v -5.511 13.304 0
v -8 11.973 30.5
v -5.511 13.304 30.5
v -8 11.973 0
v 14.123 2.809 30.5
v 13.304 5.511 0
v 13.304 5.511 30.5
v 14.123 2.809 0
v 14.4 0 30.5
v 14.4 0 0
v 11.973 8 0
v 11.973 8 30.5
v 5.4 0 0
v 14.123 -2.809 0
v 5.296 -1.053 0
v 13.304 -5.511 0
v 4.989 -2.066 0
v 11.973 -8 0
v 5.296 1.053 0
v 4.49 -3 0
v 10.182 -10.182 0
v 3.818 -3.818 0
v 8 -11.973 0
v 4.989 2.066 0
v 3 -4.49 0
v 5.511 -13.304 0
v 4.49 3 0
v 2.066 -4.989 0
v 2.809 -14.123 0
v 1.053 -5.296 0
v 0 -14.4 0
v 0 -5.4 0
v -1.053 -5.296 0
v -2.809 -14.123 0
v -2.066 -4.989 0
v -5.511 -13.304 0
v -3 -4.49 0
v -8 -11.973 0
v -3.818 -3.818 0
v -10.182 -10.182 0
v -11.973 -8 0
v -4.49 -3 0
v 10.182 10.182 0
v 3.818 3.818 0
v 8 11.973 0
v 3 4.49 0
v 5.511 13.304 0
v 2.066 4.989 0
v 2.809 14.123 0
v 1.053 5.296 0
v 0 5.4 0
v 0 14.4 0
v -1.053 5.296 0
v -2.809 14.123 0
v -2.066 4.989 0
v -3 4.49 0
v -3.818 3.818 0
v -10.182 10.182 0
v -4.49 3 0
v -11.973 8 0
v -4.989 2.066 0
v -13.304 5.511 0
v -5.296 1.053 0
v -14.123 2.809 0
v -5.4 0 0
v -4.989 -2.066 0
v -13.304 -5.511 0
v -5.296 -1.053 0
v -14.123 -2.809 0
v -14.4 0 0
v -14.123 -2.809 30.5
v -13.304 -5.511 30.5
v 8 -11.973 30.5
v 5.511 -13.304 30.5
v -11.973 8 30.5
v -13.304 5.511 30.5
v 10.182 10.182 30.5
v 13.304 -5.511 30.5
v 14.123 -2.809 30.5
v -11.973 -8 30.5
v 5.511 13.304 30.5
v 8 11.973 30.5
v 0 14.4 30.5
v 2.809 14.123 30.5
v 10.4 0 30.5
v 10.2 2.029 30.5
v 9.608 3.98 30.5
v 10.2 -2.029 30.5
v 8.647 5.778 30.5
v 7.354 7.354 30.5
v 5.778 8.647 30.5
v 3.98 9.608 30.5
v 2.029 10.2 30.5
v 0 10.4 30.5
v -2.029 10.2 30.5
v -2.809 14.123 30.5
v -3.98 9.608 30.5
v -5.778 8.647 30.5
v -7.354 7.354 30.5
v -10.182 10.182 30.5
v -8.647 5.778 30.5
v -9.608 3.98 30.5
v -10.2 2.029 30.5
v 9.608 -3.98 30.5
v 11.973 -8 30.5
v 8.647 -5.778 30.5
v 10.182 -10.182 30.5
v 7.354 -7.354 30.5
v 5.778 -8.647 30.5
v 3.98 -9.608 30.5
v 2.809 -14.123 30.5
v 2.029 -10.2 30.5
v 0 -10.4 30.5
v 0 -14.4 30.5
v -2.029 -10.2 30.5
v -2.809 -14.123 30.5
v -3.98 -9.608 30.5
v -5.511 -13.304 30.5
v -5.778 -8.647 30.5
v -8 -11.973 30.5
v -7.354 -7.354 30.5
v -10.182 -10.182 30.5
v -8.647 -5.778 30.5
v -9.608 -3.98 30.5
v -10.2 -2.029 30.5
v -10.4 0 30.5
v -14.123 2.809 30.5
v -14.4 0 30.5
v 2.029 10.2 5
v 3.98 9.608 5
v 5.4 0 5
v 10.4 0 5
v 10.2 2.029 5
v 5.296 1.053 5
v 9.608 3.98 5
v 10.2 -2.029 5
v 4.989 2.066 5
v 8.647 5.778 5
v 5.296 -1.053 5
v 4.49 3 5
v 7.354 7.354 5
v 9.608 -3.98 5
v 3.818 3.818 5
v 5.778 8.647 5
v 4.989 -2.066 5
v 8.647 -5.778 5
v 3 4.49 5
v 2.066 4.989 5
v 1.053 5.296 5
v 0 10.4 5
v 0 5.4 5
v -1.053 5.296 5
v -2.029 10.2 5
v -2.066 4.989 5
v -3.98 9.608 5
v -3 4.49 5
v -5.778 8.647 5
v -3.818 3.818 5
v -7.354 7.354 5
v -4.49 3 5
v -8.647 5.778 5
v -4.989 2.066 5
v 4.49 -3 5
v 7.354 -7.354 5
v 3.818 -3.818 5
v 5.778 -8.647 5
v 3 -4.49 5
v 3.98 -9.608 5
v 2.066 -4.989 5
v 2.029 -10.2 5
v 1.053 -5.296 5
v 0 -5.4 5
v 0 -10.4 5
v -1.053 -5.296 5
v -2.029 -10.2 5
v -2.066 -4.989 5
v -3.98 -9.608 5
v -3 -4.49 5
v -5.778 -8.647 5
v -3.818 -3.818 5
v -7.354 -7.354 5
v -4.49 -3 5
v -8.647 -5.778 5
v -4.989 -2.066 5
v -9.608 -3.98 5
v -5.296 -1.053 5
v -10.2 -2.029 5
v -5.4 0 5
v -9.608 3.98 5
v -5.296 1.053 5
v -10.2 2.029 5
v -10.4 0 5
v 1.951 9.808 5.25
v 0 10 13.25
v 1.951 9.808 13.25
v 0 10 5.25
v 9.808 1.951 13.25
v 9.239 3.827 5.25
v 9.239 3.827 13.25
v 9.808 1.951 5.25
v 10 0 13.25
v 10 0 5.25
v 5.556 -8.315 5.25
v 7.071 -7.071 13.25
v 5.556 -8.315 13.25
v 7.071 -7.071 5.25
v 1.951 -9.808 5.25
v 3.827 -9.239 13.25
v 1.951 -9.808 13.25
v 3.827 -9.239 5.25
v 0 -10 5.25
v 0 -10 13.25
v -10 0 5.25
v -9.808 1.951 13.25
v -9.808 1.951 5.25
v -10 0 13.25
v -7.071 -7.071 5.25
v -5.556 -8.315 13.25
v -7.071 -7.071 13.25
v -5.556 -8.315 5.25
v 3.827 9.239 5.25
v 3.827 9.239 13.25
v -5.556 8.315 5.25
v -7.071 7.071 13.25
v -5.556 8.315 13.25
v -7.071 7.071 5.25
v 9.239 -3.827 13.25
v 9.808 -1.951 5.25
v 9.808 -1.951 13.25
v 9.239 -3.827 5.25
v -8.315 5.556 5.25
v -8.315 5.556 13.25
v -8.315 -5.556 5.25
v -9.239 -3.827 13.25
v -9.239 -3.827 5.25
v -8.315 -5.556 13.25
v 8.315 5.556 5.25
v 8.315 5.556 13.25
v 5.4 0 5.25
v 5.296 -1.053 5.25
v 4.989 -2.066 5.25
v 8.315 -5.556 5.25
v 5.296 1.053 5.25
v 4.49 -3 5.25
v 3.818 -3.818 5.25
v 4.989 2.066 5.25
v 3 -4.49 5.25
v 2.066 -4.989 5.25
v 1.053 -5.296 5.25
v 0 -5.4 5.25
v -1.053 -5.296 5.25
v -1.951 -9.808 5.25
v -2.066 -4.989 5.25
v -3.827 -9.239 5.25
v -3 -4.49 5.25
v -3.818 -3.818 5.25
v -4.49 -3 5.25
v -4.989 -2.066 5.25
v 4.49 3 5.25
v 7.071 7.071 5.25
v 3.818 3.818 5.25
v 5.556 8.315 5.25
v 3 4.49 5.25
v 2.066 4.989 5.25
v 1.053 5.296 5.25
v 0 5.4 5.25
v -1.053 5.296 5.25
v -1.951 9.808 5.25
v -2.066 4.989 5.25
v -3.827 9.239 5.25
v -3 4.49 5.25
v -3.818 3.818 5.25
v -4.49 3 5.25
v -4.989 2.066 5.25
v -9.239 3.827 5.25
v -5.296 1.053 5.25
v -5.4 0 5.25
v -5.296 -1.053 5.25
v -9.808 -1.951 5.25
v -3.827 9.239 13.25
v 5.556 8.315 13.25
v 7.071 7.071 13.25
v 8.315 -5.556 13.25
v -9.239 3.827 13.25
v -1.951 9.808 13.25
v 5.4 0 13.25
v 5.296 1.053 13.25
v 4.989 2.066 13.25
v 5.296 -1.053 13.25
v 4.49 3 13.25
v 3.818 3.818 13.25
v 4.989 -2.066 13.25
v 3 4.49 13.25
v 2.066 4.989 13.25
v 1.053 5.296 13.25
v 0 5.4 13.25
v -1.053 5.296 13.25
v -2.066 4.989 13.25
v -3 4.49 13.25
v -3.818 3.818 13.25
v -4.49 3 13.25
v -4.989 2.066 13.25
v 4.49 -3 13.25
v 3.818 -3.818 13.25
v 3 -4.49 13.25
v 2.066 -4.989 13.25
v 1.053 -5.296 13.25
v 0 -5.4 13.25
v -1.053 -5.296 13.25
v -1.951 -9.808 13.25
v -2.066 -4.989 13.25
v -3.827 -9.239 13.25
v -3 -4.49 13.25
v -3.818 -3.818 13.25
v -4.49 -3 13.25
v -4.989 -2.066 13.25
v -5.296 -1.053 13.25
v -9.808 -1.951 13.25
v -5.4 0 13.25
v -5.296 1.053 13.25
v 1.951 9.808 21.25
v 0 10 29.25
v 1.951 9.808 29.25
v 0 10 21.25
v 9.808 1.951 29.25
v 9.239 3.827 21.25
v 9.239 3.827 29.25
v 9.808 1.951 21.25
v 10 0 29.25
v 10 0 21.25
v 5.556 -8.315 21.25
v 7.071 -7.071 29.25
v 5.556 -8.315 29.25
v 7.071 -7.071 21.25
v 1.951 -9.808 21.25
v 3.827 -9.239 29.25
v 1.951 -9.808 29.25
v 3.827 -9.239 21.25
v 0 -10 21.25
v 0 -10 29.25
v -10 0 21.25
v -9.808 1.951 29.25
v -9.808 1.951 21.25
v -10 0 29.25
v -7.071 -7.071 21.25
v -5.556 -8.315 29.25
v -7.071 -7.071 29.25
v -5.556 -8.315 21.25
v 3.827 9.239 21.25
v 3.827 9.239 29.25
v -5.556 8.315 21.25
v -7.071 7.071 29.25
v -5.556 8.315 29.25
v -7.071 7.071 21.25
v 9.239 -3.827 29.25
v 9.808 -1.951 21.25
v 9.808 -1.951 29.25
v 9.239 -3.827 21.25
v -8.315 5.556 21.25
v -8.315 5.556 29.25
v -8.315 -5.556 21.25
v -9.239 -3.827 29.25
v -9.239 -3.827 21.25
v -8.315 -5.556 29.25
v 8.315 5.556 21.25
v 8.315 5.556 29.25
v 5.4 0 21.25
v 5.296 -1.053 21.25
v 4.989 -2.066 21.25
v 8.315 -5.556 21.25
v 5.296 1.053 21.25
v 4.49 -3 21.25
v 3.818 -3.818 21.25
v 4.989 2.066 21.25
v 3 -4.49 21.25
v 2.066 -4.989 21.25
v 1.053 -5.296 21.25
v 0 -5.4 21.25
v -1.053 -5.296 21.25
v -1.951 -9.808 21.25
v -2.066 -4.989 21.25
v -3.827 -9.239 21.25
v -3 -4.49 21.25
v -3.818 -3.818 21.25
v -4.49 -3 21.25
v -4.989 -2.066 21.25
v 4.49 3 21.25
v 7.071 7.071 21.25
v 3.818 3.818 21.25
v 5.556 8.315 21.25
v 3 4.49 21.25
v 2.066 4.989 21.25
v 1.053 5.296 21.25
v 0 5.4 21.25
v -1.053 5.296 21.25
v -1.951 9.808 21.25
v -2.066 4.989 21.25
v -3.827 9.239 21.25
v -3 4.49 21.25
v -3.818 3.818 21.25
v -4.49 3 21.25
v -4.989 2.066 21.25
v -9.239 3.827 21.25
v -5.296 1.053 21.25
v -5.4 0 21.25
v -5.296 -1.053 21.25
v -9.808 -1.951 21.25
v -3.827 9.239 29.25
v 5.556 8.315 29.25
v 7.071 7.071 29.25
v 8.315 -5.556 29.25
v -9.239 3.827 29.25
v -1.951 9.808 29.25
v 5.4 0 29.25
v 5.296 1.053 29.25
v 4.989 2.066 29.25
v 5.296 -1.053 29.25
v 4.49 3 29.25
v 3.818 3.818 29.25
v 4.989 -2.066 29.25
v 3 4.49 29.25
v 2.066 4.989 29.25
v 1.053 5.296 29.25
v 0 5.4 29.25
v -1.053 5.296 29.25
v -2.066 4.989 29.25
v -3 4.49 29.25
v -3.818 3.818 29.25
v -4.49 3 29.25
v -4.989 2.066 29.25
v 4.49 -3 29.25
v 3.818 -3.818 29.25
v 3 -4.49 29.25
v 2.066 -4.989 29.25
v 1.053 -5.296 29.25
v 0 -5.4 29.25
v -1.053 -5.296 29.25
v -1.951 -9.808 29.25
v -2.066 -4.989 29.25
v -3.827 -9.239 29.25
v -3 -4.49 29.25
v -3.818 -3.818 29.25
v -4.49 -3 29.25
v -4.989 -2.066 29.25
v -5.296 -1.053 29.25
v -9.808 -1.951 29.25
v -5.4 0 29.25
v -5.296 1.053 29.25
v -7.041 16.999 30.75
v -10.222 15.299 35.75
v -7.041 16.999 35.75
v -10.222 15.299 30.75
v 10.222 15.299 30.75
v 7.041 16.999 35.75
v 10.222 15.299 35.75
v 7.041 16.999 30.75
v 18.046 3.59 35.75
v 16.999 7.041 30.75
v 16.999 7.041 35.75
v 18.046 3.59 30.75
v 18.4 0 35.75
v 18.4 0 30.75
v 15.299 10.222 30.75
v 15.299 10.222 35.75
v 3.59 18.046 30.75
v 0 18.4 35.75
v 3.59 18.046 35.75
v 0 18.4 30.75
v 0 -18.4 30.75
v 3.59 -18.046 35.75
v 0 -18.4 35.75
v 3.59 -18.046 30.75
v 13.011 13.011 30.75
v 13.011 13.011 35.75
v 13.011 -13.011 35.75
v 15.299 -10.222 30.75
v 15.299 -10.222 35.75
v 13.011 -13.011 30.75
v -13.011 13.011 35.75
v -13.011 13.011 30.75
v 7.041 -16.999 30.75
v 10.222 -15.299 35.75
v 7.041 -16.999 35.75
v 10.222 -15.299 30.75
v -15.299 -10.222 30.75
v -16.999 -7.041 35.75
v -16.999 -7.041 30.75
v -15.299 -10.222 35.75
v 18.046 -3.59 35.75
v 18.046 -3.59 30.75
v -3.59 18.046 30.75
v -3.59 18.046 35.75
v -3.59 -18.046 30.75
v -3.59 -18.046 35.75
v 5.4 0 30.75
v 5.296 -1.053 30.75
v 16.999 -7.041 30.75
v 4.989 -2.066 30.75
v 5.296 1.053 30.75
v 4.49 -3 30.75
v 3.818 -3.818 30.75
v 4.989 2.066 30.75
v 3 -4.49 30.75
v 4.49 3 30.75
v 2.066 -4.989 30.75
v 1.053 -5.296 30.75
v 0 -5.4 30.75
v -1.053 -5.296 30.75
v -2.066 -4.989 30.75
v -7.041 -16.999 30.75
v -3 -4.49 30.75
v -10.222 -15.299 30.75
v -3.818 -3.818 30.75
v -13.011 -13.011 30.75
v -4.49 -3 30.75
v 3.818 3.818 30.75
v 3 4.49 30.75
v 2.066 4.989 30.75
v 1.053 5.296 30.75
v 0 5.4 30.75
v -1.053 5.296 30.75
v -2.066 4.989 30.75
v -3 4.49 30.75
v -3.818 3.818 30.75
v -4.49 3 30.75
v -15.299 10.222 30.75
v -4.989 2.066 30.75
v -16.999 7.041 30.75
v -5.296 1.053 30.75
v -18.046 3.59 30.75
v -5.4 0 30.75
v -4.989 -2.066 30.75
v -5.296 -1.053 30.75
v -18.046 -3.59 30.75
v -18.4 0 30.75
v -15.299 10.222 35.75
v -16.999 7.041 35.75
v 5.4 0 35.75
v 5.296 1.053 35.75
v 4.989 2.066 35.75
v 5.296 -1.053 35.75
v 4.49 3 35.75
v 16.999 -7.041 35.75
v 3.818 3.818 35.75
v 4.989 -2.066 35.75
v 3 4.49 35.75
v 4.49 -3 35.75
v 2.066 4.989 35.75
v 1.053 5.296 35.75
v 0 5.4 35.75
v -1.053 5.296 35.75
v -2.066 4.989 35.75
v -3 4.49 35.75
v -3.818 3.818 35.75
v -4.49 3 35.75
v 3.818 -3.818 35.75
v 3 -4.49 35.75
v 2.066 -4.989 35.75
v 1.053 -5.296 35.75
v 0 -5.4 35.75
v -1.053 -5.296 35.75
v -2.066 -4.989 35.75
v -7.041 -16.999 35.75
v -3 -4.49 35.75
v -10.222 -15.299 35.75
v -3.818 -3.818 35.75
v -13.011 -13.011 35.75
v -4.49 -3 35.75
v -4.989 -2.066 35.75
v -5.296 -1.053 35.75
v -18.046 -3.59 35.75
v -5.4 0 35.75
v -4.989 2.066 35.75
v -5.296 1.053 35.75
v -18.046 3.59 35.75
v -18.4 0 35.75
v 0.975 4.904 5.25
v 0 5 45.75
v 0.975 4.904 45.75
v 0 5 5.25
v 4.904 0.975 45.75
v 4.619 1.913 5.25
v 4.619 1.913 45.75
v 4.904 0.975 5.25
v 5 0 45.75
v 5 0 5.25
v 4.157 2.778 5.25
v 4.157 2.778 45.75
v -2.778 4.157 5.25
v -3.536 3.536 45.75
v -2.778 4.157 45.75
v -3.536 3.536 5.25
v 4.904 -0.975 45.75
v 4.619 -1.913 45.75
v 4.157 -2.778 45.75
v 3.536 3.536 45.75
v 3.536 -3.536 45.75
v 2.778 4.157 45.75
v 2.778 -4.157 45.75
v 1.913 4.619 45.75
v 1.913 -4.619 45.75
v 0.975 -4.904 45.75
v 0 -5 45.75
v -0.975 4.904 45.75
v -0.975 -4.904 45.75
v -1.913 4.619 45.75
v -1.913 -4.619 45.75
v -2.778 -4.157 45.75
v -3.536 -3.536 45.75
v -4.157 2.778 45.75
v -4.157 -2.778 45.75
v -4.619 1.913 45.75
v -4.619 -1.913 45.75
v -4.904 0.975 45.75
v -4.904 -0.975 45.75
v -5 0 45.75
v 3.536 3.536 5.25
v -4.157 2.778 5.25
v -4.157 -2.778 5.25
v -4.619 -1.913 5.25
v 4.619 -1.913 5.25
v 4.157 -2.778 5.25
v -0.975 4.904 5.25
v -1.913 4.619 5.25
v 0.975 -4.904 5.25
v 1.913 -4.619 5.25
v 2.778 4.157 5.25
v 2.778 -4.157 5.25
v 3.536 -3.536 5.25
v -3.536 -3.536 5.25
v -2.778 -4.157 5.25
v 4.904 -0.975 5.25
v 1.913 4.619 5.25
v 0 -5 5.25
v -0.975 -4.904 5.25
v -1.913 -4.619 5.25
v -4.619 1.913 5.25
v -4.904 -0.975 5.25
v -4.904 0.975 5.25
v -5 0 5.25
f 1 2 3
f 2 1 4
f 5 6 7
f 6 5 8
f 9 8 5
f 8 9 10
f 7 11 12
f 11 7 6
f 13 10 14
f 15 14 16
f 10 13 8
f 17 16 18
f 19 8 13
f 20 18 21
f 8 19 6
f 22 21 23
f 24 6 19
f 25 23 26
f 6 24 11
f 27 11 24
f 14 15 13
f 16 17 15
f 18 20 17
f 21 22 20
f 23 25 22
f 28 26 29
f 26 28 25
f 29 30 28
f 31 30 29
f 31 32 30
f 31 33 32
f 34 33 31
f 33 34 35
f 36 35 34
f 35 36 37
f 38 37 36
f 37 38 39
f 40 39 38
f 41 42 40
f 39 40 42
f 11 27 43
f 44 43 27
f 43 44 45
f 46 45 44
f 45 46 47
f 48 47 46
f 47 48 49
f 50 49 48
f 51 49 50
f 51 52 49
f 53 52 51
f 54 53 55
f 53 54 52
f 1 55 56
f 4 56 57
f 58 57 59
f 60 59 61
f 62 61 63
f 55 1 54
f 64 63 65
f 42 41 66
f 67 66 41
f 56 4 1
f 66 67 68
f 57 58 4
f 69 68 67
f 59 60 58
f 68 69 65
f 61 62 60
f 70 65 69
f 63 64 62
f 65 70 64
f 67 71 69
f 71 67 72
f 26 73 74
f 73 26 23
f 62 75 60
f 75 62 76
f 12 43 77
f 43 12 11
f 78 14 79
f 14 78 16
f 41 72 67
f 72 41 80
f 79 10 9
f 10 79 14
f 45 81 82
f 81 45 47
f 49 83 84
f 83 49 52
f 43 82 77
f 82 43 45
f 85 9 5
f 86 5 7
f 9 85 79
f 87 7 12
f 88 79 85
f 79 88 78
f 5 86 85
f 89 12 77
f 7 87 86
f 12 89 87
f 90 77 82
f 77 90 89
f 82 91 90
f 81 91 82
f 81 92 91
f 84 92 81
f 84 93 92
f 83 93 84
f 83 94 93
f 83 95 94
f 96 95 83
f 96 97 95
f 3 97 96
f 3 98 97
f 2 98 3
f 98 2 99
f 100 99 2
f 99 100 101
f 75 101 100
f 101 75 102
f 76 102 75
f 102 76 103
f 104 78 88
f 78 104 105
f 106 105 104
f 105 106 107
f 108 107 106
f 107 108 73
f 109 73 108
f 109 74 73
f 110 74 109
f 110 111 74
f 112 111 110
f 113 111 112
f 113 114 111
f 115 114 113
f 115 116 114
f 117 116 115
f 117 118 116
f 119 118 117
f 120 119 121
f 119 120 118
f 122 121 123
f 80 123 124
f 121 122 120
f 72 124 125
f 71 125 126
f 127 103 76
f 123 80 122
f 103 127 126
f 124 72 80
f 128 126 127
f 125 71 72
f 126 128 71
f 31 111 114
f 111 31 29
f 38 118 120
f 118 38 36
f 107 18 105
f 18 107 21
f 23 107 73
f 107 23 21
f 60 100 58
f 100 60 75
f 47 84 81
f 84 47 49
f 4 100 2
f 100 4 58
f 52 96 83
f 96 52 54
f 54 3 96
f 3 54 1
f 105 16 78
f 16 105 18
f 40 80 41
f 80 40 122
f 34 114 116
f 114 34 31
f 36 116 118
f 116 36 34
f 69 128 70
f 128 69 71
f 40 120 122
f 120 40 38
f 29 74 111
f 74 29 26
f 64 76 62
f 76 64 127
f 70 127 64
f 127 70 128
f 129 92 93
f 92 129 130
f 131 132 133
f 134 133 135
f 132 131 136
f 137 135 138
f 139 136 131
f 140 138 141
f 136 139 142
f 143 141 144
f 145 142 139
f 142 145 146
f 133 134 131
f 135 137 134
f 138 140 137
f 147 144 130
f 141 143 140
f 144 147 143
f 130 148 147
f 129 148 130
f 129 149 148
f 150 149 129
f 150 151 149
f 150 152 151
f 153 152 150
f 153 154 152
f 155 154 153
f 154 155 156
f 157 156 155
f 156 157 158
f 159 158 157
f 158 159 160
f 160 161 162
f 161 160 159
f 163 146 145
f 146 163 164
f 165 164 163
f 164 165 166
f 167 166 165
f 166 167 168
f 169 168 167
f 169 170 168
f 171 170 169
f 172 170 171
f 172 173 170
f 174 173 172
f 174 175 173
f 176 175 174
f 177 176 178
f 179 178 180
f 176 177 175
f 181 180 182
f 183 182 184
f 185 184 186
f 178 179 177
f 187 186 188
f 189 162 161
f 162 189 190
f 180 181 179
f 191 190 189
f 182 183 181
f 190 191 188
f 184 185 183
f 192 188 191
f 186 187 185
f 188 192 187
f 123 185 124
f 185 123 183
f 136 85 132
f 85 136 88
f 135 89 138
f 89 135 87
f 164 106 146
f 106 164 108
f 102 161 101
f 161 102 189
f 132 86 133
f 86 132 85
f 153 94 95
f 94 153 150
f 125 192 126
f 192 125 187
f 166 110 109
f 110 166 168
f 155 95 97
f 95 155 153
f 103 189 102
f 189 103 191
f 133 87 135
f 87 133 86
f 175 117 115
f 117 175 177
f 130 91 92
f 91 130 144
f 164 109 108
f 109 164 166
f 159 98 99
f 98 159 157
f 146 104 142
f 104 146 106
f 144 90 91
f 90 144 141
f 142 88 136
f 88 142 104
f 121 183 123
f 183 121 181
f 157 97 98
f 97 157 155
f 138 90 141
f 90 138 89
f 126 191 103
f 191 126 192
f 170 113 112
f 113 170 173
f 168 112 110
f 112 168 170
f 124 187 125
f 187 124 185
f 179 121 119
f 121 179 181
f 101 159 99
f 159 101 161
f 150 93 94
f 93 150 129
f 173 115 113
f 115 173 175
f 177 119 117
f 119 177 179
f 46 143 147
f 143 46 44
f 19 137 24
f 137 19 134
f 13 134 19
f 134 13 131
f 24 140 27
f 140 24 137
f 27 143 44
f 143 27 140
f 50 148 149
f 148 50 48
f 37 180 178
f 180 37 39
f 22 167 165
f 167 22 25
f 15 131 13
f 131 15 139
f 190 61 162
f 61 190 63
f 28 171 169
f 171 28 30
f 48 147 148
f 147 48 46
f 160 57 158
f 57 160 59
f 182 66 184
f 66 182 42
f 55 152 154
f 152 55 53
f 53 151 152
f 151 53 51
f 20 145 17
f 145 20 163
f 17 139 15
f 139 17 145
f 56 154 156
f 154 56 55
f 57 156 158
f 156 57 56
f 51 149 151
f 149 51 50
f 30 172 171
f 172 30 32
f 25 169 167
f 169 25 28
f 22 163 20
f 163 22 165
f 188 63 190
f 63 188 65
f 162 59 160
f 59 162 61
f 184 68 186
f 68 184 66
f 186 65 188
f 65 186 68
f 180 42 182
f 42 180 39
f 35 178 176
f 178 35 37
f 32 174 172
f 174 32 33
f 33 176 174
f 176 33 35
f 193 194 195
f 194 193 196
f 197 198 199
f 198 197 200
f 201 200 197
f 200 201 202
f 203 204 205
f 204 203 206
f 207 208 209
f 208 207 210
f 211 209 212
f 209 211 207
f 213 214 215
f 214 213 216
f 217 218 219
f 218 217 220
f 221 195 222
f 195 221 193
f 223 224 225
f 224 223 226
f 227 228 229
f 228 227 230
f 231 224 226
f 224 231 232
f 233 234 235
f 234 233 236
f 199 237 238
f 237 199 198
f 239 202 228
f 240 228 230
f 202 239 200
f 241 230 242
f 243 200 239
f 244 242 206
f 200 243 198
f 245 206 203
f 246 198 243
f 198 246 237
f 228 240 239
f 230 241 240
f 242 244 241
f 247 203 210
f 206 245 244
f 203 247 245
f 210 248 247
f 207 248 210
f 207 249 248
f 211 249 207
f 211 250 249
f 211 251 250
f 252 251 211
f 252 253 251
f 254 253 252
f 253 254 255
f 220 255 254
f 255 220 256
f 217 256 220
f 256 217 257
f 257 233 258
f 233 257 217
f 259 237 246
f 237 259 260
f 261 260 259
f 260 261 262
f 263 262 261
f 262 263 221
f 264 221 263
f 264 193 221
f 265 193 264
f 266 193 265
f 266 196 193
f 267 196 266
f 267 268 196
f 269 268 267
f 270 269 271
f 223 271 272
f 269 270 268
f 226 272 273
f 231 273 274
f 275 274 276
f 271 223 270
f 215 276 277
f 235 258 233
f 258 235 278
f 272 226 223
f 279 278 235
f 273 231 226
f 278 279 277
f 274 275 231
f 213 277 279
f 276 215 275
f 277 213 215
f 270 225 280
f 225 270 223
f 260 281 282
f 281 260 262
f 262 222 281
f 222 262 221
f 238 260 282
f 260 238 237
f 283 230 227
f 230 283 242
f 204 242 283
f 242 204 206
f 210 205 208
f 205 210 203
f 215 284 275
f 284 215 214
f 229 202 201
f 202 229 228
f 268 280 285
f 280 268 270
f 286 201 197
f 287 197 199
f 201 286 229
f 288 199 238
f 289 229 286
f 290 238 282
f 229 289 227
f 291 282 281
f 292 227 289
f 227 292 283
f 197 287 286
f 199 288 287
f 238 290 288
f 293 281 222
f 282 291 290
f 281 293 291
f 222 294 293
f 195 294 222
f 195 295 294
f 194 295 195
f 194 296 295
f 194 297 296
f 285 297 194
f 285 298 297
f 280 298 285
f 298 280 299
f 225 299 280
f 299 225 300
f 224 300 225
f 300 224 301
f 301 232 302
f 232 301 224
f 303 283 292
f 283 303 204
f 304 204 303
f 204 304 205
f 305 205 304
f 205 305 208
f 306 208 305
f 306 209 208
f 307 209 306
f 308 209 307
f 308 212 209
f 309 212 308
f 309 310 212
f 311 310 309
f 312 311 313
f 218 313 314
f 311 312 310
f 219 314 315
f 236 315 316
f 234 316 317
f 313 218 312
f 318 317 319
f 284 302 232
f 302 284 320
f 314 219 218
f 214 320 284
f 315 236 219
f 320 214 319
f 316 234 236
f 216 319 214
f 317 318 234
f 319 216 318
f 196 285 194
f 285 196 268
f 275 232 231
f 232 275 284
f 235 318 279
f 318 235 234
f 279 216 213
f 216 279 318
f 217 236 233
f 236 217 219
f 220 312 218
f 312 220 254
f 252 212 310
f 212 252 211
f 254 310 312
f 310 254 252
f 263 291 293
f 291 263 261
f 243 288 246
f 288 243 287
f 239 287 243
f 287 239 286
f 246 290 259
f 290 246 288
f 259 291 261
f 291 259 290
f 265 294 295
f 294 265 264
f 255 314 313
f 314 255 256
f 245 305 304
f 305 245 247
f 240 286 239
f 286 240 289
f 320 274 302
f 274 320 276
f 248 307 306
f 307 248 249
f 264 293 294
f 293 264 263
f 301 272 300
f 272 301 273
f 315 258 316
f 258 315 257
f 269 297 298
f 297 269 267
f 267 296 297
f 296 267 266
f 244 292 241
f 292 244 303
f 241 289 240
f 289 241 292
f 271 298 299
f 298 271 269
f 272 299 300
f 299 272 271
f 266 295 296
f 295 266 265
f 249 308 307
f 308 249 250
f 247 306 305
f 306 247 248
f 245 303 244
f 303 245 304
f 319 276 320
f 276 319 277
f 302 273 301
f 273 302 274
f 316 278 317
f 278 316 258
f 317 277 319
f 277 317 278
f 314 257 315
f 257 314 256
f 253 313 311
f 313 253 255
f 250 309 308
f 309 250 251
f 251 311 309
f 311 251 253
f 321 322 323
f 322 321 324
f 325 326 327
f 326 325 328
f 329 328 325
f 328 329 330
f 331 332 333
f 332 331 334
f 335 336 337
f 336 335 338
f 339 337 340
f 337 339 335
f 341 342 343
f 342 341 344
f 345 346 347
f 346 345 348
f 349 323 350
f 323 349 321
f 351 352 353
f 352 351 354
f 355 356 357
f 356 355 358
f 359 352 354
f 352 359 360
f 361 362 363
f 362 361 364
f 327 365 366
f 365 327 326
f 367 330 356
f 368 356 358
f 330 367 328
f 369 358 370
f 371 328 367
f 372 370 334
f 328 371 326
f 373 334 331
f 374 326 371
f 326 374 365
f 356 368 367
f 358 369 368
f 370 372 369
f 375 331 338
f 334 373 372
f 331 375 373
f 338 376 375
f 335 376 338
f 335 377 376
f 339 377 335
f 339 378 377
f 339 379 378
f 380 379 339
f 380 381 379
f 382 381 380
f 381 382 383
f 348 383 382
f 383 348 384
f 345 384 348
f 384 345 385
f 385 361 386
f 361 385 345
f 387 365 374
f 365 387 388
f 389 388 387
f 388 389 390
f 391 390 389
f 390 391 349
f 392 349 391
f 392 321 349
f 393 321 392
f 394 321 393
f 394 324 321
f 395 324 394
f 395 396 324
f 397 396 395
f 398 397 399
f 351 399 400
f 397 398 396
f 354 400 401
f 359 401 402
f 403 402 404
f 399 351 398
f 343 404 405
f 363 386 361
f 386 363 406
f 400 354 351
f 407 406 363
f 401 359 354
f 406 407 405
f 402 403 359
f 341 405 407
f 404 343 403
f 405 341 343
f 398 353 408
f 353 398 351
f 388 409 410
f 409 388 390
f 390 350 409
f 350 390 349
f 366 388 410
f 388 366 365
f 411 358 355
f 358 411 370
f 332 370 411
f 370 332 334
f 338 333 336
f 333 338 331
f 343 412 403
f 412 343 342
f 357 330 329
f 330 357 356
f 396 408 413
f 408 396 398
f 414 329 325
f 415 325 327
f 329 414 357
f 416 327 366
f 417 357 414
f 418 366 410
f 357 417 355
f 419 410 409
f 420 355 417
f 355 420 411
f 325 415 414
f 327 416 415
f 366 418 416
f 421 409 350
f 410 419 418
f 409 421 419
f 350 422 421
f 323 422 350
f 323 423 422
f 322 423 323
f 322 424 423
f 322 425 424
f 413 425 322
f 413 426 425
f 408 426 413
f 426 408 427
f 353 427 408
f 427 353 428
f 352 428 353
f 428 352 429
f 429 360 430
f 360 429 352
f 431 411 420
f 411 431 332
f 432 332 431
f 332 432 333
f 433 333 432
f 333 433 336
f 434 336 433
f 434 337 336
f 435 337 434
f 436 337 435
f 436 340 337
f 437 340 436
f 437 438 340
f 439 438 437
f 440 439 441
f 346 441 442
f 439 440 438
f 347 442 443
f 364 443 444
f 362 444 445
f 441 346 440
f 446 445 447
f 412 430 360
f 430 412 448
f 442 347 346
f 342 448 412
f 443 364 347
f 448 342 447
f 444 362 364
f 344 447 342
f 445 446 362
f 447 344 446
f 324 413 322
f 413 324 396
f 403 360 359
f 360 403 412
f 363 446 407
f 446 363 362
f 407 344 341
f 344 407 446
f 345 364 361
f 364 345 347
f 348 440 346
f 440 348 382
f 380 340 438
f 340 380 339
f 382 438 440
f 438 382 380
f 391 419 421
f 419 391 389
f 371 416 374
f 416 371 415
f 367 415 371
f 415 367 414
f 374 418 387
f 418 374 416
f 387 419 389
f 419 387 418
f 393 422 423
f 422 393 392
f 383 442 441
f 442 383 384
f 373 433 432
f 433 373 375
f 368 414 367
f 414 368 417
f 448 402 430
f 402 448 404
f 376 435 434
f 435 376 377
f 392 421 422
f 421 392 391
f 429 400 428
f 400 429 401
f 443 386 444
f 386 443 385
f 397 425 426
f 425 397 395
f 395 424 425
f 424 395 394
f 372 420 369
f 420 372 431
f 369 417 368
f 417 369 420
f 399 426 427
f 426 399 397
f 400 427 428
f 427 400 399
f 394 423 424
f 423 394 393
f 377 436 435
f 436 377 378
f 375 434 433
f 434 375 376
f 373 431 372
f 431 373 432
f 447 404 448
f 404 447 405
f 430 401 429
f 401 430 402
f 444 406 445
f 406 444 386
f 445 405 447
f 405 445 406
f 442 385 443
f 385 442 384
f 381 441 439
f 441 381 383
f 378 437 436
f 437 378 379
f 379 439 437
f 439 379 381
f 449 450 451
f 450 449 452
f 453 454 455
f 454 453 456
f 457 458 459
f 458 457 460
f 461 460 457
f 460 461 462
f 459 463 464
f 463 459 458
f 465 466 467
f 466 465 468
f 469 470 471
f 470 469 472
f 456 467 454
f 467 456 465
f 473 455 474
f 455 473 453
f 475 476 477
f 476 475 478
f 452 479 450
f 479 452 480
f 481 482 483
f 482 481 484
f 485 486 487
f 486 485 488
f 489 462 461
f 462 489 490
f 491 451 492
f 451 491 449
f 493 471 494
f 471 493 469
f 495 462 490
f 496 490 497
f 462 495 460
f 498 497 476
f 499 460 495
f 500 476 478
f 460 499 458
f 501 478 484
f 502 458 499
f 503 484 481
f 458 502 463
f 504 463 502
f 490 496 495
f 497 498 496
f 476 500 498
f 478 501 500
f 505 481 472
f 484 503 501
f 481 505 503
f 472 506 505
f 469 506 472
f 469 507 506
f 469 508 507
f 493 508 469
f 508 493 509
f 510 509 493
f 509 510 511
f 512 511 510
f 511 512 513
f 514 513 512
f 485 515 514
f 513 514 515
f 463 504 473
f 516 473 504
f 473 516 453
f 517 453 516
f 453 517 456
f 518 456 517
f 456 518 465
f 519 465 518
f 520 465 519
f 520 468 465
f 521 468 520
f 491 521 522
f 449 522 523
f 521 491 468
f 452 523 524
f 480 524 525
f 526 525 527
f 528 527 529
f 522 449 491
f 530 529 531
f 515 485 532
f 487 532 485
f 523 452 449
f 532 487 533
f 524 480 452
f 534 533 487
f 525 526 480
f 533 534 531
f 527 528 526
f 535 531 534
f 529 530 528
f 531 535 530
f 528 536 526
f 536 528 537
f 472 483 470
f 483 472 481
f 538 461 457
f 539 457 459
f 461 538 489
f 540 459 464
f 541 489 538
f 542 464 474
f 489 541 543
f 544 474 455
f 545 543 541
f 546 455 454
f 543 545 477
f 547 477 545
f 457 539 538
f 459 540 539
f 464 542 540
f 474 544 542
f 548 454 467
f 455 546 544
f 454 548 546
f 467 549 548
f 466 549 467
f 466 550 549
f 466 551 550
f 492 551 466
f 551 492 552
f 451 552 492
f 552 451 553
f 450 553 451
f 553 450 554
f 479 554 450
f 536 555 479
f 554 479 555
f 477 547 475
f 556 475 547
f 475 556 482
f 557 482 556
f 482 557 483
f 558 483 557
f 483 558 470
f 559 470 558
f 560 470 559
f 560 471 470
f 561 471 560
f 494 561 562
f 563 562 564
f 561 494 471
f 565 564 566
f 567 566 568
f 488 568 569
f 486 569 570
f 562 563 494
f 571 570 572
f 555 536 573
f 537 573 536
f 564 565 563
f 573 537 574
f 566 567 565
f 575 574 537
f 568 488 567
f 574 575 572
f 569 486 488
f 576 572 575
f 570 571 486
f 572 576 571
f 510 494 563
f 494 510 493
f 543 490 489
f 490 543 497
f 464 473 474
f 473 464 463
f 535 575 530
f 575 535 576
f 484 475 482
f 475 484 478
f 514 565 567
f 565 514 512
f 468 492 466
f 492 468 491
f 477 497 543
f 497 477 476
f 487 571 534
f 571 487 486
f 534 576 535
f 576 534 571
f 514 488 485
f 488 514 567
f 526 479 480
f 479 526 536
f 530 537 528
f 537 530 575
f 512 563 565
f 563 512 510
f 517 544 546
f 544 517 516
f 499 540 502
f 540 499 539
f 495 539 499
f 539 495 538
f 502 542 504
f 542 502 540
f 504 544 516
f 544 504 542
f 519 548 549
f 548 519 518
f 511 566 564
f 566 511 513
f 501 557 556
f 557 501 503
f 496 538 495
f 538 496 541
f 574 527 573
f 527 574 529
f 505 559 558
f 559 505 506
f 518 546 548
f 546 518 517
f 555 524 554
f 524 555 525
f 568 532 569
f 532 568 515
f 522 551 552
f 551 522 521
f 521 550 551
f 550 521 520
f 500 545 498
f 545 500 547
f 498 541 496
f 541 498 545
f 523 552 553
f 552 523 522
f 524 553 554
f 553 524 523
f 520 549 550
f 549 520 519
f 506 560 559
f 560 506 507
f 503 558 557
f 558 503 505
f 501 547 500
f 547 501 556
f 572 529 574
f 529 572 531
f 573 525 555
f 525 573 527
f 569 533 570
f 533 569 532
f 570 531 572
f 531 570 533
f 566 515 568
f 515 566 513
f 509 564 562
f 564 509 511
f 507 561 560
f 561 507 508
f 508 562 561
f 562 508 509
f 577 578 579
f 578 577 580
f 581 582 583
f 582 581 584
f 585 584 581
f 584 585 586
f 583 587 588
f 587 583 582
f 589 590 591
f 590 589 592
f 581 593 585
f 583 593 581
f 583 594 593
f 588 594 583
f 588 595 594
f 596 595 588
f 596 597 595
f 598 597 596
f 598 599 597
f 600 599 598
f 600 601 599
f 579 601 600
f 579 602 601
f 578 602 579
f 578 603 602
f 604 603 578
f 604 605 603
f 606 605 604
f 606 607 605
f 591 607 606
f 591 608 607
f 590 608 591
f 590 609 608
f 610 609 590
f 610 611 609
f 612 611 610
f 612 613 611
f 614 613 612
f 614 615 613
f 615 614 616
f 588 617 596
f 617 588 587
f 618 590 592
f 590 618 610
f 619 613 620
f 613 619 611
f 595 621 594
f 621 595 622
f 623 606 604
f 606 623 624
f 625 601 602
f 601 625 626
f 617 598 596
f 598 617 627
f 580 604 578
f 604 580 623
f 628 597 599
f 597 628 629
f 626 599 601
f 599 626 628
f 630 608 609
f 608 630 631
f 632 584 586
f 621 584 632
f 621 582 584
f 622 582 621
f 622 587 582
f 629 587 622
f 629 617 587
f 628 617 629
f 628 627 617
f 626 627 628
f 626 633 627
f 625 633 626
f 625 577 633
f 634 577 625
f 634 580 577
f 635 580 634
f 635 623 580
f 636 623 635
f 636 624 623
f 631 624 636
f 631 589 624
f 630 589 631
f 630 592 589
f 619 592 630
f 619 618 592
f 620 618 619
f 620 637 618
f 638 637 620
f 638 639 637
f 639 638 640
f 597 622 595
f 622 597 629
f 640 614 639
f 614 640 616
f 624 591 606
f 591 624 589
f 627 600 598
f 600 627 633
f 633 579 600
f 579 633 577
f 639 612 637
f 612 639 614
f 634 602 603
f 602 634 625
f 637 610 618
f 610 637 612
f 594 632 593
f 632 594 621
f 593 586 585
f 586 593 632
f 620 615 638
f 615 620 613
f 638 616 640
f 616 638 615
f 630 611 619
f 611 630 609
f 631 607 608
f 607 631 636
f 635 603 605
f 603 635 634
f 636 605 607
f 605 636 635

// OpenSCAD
$fn = 32;

// ------------------------------------------------------------------------
// Shaft station: cup d28.8 x 30.5 mm, shaft d10
// Every part is its own module, assembly() places every instance.
// ------------------------------------------------------------------------

// --- part 1 ---
module housing_cup() {
  difference() {
    cylinder(h = 30.5, d = 28.8);
    translate([0, 0, 5]) cylinder(h = 26.5, d = 20.8);
    translate([0, 0, -1]) cylinder(h = 7, d = 10.8);
  }
}

// --- part 2 ---
module bearing_lower() {
  difference() {
      translate([0, 0, 0]) cylinder(h = 8, d = 20);
      translate([0, 0, -1]) cylinder(h = 10, d = 10.8);
    }
}

// --- part 3 ---
module bearing_upper() {
  difference() {
      translate([0, 0, 0]) cylinder(h = 8, d = 20);
      translate([0, 0, -1]) cylinder(h = 10, d = 10.8);
    }
}

// --- part 4 ---
module station_shaft() {
  translate([0, 0, -20.25]) cylinder(h = 40.5, d = 10);
}

// --- part 5 ---
module station_cover() {
  difference() {
    cylinder(h = 5, d = 36.8);
    translate([0, 0, -1]) cylinder(h = 7, d = 10.8);
  }
}

// --- assembly ---
module assembly() {
  color([0.80, 0.24, 0.20]) translate([0, 0, 0]) rotate([0, 0, 0]) housing_cup();
  color([0.20, 0.45, 0.75]) translate([0, 0, 5.25]) rotate([0, 0, 0]) bearing_lower();
  color([0.25, 0.62, 0.32]) translate([0, 0, 21.25]) rotate([0, 0, 0]) bearing_upper();
  color([0.92, 0.70, 0.18]) translate([0, 0, 25.5]) rotate([0, 0, 0]) station_shaft();
  color([0.58, 0.35, 0.70]) translate([0, 0, 30.75]) rotate([0, 0, 0]) station_cover();
}

assembly();
